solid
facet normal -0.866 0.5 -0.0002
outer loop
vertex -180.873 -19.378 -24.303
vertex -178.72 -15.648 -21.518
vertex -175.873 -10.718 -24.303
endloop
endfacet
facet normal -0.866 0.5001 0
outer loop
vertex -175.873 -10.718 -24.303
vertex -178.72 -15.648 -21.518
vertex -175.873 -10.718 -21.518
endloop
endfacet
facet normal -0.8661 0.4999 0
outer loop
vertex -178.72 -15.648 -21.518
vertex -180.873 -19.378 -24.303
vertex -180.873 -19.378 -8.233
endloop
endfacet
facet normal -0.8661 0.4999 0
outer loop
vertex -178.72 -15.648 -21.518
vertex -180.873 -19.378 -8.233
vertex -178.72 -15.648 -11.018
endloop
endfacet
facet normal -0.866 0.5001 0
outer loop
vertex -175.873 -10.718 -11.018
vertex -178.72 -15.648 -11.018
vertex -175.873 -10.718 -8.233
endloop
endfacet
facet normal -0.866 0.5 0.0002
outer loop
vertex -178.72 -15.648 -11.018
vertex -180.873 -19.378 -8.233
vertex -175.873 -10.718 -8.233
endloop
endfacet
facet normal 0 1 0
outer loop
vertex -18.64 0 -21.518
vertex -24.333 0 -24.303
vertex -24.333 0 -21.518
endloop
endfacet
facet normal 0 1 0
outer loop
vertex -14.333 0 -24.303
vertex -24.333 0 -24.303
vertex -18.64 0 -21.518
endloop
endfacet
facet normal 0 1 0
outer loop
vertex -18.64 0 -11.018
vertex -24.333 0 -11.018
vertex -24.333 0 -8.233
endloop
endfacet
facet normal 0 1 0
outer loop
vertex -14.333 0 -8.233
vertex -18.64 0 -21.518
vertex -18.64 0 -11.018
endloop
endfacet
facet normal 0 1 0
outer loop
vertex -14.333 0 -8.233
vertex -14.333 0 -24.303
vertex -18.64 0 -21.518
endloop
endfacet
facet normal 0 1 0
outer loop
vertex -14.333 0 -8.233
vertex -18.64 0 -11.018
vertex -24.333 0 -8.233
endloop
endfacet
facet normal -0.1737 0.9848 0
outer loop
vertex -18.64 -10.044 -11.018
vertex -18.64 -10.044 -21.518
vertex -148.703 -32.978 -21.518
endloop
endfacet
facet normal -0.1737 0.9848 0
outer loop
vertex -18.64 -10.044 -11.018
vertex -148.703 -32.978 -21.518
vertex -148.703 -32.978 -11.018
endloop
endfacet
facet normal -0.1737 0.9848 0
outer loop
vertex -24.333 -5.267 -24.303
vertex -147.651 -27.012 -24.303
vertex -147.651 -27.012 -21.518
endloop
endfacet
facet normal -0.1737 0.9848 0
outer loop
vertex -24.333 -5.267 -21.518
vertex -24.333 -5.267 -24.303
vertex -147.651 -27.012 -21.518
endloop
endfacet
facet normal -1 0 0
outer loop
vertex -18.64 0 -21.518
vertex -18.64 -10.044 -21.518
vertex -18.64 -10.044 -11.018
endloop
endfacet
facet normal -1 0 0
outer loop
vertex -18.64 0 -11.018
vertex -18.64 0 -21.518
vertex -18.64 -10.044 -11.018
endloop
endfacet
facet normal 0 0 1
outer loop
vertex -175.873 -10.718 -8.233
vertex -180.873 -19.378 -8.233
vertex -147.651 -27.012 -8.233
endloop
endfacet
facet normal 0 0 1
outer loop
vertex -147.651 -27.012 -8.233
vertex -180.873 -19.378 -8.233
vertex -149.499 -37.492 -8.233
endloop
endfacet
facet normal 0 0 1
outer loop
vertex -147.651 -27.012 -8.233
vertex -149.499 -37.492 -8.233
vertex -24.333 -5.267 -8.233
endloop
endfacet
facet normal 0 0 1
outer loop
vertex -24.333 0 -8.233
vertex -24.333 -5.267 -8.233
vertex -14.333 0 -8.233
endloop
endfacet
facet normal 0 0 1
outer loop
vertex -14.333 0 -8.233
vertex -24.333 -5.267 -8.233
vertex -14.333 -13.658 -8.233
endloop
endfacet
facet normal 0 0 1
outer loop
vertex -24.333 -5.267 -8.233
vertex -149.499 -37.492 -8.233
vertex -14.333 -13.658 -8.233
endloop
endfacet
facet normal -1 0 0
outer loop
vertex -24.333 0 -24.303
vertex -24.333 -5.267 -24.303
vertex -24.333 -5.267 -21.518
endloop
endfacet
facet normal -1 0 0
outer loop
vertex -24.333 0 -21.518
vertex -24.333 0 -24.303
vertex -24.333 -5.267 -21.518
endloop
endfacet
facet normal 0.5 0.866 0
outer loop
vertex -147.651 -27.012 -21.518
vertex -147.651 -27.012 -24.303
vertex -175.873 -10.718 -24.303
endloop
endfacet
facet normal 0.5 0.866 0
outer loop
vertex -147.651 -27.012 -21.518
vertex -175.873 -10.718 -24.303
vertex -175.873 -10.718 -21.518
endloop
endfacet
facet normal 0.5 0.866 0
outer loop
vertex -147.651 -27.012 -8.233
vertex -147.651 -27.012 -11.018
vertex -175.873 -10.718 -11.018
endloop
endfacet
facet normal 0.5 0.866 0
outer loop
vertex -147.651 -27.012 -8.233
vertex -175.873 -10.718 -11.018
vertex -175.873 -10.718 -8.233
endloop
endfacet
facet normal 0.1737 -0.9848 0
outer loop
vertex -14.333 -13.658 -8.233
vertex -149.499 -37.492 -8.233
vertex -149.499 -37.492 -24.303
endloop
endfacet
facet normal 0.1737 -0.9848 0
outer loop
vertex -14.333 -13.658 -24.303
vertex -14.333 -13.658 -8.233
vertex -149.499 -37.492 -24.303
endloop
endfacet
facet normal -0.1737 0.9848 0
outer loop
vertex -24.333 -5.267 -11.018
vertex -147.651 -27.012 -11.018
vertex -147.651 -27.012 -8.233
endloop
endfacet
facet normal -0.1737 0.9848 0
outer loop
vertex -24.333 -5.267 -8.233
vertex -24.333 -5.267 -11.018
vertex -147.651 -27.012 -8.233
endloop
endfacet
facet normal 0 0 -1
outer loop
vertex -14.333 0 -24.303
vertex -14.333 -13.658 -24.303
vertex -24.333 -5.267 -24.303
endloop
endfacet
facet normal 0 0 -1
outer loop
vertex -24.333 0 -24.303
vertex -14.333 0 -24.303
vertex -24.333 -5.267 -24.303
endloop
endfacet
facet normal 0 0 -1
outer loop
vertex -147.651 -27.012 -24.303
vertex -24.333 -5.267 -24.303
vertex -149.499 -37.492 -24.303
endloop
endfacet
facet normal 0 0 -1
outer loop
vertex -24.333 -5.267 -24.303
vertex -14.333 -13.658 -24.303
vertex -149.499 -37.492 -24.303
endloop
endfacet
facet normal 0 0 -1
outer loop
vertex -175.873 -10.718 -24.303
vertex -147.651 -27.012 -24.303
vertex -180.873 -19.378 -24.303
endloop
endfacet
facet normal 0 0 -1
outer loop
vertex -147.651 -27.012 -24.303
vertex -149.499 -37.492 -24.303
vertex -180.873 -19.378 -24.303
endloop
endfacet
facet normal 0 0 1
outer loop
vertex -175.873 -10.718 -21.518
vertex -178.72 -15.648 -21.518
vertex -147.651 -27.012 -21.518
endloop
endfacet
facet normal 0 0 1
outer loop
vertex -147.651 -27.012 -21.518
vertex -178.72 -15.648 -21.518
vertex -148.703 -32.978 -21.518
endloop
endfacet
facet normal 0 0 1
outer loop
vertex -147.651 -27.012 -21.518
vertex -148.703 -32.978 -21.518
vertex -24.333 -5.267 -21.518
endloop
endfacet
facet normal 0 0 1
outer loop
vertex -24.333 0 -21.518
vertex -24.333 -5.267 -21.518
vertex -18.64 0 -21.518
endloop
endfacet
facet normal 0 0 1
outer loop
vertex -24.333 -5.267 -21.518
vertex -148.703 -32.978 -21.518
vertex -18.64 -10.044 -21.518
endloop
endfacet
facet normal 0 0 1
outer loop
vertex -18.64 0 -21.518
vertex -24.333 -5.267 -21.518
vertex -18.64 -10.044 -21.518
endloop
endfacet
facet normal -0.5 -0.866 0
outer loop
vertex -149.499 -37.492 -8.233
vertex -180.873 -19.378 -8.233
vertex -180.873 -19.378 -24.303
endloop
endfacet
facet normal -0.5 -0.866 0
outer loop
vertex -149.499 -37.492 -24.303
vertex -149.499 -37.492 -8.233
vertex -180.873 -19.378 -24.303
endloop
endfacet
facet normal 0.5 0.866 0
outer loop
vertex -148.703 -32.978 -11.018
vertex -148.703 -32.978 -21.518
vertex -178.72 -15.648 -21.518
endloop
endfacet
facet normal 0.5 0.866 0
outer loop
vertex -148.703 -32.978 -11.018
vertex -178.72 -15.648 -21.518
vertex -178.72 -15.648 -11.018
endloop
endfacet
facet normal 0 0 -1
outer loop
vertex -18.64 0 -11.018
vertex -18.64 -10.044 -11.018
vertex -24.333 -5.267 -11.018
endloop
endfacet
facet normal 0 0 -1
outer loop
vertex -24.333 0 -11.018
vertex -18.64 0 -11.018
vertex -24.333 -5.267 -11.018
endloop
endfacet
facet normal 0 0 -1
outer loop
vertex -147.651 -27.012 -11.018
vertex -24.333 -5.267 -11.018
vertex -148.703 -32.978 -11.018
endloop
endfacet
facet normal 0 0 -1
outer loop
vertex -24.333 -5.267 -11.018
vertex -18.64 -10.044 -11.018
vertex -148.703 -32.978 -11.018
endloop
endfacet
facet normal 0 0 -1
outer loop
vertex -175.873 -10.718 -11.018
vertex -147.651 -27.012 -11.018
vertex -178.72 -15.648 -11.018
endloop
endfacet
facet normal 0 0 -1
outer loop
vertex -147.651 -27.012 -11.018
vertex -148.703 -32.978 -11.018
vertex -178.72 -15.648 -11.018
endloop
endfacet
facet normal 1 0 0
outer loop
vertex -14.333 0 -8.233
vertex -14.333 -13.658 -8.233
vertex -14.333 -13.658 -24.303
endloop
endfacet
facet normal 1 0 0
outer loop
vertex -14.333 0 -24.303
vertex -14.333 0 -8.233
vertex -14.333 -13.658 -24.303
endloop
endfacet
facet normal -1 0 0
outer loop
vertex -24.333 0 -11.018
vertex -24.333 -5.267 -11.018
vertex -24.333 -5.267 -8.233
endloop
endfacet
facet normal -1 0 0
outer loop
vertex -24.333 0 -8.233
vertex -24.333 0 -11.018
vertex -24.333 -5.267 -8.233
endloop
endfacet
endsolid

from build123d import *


with BuildPart() as part:
    # 扫描2: sweep along a path in 草图2
    with BuildLine(Plane(origin=(0, 0, -16.268170321), x_dir=(-1, 0, 0), z_dir=(0, 0, -1))) as sweep_2_path:
        Line((18.693353683, 0), (18.693353683, -10))
        Line((18.693353683, -10), (148.693353683, -32.922507492))
        Line((148.693353683, -32.922507492), (178.693353683, -15.601999416))
    # 草图1 → 扫描2 (sweep)
    with BuildSketch(Plane(origin=(0, 0, 0), x_dir=(1, 0, 0), z_dir=(0, 1, 0))):
        Polygon((-24.333441136, 21.518170321), (-24.333441136, 24.303170321), (-14.333441136, 24.303170321), (-14.333441136, 8.233170321), (-24.333441136, 8.233170321), (-24.333441136, 11.018170321), (-18.640334153, 11.018170321), (-18.640334153, 21.518170321), align=None)
    sweep(path=sweep_2_path.line, transition=Transition.RIGHT)


solid = part.part
